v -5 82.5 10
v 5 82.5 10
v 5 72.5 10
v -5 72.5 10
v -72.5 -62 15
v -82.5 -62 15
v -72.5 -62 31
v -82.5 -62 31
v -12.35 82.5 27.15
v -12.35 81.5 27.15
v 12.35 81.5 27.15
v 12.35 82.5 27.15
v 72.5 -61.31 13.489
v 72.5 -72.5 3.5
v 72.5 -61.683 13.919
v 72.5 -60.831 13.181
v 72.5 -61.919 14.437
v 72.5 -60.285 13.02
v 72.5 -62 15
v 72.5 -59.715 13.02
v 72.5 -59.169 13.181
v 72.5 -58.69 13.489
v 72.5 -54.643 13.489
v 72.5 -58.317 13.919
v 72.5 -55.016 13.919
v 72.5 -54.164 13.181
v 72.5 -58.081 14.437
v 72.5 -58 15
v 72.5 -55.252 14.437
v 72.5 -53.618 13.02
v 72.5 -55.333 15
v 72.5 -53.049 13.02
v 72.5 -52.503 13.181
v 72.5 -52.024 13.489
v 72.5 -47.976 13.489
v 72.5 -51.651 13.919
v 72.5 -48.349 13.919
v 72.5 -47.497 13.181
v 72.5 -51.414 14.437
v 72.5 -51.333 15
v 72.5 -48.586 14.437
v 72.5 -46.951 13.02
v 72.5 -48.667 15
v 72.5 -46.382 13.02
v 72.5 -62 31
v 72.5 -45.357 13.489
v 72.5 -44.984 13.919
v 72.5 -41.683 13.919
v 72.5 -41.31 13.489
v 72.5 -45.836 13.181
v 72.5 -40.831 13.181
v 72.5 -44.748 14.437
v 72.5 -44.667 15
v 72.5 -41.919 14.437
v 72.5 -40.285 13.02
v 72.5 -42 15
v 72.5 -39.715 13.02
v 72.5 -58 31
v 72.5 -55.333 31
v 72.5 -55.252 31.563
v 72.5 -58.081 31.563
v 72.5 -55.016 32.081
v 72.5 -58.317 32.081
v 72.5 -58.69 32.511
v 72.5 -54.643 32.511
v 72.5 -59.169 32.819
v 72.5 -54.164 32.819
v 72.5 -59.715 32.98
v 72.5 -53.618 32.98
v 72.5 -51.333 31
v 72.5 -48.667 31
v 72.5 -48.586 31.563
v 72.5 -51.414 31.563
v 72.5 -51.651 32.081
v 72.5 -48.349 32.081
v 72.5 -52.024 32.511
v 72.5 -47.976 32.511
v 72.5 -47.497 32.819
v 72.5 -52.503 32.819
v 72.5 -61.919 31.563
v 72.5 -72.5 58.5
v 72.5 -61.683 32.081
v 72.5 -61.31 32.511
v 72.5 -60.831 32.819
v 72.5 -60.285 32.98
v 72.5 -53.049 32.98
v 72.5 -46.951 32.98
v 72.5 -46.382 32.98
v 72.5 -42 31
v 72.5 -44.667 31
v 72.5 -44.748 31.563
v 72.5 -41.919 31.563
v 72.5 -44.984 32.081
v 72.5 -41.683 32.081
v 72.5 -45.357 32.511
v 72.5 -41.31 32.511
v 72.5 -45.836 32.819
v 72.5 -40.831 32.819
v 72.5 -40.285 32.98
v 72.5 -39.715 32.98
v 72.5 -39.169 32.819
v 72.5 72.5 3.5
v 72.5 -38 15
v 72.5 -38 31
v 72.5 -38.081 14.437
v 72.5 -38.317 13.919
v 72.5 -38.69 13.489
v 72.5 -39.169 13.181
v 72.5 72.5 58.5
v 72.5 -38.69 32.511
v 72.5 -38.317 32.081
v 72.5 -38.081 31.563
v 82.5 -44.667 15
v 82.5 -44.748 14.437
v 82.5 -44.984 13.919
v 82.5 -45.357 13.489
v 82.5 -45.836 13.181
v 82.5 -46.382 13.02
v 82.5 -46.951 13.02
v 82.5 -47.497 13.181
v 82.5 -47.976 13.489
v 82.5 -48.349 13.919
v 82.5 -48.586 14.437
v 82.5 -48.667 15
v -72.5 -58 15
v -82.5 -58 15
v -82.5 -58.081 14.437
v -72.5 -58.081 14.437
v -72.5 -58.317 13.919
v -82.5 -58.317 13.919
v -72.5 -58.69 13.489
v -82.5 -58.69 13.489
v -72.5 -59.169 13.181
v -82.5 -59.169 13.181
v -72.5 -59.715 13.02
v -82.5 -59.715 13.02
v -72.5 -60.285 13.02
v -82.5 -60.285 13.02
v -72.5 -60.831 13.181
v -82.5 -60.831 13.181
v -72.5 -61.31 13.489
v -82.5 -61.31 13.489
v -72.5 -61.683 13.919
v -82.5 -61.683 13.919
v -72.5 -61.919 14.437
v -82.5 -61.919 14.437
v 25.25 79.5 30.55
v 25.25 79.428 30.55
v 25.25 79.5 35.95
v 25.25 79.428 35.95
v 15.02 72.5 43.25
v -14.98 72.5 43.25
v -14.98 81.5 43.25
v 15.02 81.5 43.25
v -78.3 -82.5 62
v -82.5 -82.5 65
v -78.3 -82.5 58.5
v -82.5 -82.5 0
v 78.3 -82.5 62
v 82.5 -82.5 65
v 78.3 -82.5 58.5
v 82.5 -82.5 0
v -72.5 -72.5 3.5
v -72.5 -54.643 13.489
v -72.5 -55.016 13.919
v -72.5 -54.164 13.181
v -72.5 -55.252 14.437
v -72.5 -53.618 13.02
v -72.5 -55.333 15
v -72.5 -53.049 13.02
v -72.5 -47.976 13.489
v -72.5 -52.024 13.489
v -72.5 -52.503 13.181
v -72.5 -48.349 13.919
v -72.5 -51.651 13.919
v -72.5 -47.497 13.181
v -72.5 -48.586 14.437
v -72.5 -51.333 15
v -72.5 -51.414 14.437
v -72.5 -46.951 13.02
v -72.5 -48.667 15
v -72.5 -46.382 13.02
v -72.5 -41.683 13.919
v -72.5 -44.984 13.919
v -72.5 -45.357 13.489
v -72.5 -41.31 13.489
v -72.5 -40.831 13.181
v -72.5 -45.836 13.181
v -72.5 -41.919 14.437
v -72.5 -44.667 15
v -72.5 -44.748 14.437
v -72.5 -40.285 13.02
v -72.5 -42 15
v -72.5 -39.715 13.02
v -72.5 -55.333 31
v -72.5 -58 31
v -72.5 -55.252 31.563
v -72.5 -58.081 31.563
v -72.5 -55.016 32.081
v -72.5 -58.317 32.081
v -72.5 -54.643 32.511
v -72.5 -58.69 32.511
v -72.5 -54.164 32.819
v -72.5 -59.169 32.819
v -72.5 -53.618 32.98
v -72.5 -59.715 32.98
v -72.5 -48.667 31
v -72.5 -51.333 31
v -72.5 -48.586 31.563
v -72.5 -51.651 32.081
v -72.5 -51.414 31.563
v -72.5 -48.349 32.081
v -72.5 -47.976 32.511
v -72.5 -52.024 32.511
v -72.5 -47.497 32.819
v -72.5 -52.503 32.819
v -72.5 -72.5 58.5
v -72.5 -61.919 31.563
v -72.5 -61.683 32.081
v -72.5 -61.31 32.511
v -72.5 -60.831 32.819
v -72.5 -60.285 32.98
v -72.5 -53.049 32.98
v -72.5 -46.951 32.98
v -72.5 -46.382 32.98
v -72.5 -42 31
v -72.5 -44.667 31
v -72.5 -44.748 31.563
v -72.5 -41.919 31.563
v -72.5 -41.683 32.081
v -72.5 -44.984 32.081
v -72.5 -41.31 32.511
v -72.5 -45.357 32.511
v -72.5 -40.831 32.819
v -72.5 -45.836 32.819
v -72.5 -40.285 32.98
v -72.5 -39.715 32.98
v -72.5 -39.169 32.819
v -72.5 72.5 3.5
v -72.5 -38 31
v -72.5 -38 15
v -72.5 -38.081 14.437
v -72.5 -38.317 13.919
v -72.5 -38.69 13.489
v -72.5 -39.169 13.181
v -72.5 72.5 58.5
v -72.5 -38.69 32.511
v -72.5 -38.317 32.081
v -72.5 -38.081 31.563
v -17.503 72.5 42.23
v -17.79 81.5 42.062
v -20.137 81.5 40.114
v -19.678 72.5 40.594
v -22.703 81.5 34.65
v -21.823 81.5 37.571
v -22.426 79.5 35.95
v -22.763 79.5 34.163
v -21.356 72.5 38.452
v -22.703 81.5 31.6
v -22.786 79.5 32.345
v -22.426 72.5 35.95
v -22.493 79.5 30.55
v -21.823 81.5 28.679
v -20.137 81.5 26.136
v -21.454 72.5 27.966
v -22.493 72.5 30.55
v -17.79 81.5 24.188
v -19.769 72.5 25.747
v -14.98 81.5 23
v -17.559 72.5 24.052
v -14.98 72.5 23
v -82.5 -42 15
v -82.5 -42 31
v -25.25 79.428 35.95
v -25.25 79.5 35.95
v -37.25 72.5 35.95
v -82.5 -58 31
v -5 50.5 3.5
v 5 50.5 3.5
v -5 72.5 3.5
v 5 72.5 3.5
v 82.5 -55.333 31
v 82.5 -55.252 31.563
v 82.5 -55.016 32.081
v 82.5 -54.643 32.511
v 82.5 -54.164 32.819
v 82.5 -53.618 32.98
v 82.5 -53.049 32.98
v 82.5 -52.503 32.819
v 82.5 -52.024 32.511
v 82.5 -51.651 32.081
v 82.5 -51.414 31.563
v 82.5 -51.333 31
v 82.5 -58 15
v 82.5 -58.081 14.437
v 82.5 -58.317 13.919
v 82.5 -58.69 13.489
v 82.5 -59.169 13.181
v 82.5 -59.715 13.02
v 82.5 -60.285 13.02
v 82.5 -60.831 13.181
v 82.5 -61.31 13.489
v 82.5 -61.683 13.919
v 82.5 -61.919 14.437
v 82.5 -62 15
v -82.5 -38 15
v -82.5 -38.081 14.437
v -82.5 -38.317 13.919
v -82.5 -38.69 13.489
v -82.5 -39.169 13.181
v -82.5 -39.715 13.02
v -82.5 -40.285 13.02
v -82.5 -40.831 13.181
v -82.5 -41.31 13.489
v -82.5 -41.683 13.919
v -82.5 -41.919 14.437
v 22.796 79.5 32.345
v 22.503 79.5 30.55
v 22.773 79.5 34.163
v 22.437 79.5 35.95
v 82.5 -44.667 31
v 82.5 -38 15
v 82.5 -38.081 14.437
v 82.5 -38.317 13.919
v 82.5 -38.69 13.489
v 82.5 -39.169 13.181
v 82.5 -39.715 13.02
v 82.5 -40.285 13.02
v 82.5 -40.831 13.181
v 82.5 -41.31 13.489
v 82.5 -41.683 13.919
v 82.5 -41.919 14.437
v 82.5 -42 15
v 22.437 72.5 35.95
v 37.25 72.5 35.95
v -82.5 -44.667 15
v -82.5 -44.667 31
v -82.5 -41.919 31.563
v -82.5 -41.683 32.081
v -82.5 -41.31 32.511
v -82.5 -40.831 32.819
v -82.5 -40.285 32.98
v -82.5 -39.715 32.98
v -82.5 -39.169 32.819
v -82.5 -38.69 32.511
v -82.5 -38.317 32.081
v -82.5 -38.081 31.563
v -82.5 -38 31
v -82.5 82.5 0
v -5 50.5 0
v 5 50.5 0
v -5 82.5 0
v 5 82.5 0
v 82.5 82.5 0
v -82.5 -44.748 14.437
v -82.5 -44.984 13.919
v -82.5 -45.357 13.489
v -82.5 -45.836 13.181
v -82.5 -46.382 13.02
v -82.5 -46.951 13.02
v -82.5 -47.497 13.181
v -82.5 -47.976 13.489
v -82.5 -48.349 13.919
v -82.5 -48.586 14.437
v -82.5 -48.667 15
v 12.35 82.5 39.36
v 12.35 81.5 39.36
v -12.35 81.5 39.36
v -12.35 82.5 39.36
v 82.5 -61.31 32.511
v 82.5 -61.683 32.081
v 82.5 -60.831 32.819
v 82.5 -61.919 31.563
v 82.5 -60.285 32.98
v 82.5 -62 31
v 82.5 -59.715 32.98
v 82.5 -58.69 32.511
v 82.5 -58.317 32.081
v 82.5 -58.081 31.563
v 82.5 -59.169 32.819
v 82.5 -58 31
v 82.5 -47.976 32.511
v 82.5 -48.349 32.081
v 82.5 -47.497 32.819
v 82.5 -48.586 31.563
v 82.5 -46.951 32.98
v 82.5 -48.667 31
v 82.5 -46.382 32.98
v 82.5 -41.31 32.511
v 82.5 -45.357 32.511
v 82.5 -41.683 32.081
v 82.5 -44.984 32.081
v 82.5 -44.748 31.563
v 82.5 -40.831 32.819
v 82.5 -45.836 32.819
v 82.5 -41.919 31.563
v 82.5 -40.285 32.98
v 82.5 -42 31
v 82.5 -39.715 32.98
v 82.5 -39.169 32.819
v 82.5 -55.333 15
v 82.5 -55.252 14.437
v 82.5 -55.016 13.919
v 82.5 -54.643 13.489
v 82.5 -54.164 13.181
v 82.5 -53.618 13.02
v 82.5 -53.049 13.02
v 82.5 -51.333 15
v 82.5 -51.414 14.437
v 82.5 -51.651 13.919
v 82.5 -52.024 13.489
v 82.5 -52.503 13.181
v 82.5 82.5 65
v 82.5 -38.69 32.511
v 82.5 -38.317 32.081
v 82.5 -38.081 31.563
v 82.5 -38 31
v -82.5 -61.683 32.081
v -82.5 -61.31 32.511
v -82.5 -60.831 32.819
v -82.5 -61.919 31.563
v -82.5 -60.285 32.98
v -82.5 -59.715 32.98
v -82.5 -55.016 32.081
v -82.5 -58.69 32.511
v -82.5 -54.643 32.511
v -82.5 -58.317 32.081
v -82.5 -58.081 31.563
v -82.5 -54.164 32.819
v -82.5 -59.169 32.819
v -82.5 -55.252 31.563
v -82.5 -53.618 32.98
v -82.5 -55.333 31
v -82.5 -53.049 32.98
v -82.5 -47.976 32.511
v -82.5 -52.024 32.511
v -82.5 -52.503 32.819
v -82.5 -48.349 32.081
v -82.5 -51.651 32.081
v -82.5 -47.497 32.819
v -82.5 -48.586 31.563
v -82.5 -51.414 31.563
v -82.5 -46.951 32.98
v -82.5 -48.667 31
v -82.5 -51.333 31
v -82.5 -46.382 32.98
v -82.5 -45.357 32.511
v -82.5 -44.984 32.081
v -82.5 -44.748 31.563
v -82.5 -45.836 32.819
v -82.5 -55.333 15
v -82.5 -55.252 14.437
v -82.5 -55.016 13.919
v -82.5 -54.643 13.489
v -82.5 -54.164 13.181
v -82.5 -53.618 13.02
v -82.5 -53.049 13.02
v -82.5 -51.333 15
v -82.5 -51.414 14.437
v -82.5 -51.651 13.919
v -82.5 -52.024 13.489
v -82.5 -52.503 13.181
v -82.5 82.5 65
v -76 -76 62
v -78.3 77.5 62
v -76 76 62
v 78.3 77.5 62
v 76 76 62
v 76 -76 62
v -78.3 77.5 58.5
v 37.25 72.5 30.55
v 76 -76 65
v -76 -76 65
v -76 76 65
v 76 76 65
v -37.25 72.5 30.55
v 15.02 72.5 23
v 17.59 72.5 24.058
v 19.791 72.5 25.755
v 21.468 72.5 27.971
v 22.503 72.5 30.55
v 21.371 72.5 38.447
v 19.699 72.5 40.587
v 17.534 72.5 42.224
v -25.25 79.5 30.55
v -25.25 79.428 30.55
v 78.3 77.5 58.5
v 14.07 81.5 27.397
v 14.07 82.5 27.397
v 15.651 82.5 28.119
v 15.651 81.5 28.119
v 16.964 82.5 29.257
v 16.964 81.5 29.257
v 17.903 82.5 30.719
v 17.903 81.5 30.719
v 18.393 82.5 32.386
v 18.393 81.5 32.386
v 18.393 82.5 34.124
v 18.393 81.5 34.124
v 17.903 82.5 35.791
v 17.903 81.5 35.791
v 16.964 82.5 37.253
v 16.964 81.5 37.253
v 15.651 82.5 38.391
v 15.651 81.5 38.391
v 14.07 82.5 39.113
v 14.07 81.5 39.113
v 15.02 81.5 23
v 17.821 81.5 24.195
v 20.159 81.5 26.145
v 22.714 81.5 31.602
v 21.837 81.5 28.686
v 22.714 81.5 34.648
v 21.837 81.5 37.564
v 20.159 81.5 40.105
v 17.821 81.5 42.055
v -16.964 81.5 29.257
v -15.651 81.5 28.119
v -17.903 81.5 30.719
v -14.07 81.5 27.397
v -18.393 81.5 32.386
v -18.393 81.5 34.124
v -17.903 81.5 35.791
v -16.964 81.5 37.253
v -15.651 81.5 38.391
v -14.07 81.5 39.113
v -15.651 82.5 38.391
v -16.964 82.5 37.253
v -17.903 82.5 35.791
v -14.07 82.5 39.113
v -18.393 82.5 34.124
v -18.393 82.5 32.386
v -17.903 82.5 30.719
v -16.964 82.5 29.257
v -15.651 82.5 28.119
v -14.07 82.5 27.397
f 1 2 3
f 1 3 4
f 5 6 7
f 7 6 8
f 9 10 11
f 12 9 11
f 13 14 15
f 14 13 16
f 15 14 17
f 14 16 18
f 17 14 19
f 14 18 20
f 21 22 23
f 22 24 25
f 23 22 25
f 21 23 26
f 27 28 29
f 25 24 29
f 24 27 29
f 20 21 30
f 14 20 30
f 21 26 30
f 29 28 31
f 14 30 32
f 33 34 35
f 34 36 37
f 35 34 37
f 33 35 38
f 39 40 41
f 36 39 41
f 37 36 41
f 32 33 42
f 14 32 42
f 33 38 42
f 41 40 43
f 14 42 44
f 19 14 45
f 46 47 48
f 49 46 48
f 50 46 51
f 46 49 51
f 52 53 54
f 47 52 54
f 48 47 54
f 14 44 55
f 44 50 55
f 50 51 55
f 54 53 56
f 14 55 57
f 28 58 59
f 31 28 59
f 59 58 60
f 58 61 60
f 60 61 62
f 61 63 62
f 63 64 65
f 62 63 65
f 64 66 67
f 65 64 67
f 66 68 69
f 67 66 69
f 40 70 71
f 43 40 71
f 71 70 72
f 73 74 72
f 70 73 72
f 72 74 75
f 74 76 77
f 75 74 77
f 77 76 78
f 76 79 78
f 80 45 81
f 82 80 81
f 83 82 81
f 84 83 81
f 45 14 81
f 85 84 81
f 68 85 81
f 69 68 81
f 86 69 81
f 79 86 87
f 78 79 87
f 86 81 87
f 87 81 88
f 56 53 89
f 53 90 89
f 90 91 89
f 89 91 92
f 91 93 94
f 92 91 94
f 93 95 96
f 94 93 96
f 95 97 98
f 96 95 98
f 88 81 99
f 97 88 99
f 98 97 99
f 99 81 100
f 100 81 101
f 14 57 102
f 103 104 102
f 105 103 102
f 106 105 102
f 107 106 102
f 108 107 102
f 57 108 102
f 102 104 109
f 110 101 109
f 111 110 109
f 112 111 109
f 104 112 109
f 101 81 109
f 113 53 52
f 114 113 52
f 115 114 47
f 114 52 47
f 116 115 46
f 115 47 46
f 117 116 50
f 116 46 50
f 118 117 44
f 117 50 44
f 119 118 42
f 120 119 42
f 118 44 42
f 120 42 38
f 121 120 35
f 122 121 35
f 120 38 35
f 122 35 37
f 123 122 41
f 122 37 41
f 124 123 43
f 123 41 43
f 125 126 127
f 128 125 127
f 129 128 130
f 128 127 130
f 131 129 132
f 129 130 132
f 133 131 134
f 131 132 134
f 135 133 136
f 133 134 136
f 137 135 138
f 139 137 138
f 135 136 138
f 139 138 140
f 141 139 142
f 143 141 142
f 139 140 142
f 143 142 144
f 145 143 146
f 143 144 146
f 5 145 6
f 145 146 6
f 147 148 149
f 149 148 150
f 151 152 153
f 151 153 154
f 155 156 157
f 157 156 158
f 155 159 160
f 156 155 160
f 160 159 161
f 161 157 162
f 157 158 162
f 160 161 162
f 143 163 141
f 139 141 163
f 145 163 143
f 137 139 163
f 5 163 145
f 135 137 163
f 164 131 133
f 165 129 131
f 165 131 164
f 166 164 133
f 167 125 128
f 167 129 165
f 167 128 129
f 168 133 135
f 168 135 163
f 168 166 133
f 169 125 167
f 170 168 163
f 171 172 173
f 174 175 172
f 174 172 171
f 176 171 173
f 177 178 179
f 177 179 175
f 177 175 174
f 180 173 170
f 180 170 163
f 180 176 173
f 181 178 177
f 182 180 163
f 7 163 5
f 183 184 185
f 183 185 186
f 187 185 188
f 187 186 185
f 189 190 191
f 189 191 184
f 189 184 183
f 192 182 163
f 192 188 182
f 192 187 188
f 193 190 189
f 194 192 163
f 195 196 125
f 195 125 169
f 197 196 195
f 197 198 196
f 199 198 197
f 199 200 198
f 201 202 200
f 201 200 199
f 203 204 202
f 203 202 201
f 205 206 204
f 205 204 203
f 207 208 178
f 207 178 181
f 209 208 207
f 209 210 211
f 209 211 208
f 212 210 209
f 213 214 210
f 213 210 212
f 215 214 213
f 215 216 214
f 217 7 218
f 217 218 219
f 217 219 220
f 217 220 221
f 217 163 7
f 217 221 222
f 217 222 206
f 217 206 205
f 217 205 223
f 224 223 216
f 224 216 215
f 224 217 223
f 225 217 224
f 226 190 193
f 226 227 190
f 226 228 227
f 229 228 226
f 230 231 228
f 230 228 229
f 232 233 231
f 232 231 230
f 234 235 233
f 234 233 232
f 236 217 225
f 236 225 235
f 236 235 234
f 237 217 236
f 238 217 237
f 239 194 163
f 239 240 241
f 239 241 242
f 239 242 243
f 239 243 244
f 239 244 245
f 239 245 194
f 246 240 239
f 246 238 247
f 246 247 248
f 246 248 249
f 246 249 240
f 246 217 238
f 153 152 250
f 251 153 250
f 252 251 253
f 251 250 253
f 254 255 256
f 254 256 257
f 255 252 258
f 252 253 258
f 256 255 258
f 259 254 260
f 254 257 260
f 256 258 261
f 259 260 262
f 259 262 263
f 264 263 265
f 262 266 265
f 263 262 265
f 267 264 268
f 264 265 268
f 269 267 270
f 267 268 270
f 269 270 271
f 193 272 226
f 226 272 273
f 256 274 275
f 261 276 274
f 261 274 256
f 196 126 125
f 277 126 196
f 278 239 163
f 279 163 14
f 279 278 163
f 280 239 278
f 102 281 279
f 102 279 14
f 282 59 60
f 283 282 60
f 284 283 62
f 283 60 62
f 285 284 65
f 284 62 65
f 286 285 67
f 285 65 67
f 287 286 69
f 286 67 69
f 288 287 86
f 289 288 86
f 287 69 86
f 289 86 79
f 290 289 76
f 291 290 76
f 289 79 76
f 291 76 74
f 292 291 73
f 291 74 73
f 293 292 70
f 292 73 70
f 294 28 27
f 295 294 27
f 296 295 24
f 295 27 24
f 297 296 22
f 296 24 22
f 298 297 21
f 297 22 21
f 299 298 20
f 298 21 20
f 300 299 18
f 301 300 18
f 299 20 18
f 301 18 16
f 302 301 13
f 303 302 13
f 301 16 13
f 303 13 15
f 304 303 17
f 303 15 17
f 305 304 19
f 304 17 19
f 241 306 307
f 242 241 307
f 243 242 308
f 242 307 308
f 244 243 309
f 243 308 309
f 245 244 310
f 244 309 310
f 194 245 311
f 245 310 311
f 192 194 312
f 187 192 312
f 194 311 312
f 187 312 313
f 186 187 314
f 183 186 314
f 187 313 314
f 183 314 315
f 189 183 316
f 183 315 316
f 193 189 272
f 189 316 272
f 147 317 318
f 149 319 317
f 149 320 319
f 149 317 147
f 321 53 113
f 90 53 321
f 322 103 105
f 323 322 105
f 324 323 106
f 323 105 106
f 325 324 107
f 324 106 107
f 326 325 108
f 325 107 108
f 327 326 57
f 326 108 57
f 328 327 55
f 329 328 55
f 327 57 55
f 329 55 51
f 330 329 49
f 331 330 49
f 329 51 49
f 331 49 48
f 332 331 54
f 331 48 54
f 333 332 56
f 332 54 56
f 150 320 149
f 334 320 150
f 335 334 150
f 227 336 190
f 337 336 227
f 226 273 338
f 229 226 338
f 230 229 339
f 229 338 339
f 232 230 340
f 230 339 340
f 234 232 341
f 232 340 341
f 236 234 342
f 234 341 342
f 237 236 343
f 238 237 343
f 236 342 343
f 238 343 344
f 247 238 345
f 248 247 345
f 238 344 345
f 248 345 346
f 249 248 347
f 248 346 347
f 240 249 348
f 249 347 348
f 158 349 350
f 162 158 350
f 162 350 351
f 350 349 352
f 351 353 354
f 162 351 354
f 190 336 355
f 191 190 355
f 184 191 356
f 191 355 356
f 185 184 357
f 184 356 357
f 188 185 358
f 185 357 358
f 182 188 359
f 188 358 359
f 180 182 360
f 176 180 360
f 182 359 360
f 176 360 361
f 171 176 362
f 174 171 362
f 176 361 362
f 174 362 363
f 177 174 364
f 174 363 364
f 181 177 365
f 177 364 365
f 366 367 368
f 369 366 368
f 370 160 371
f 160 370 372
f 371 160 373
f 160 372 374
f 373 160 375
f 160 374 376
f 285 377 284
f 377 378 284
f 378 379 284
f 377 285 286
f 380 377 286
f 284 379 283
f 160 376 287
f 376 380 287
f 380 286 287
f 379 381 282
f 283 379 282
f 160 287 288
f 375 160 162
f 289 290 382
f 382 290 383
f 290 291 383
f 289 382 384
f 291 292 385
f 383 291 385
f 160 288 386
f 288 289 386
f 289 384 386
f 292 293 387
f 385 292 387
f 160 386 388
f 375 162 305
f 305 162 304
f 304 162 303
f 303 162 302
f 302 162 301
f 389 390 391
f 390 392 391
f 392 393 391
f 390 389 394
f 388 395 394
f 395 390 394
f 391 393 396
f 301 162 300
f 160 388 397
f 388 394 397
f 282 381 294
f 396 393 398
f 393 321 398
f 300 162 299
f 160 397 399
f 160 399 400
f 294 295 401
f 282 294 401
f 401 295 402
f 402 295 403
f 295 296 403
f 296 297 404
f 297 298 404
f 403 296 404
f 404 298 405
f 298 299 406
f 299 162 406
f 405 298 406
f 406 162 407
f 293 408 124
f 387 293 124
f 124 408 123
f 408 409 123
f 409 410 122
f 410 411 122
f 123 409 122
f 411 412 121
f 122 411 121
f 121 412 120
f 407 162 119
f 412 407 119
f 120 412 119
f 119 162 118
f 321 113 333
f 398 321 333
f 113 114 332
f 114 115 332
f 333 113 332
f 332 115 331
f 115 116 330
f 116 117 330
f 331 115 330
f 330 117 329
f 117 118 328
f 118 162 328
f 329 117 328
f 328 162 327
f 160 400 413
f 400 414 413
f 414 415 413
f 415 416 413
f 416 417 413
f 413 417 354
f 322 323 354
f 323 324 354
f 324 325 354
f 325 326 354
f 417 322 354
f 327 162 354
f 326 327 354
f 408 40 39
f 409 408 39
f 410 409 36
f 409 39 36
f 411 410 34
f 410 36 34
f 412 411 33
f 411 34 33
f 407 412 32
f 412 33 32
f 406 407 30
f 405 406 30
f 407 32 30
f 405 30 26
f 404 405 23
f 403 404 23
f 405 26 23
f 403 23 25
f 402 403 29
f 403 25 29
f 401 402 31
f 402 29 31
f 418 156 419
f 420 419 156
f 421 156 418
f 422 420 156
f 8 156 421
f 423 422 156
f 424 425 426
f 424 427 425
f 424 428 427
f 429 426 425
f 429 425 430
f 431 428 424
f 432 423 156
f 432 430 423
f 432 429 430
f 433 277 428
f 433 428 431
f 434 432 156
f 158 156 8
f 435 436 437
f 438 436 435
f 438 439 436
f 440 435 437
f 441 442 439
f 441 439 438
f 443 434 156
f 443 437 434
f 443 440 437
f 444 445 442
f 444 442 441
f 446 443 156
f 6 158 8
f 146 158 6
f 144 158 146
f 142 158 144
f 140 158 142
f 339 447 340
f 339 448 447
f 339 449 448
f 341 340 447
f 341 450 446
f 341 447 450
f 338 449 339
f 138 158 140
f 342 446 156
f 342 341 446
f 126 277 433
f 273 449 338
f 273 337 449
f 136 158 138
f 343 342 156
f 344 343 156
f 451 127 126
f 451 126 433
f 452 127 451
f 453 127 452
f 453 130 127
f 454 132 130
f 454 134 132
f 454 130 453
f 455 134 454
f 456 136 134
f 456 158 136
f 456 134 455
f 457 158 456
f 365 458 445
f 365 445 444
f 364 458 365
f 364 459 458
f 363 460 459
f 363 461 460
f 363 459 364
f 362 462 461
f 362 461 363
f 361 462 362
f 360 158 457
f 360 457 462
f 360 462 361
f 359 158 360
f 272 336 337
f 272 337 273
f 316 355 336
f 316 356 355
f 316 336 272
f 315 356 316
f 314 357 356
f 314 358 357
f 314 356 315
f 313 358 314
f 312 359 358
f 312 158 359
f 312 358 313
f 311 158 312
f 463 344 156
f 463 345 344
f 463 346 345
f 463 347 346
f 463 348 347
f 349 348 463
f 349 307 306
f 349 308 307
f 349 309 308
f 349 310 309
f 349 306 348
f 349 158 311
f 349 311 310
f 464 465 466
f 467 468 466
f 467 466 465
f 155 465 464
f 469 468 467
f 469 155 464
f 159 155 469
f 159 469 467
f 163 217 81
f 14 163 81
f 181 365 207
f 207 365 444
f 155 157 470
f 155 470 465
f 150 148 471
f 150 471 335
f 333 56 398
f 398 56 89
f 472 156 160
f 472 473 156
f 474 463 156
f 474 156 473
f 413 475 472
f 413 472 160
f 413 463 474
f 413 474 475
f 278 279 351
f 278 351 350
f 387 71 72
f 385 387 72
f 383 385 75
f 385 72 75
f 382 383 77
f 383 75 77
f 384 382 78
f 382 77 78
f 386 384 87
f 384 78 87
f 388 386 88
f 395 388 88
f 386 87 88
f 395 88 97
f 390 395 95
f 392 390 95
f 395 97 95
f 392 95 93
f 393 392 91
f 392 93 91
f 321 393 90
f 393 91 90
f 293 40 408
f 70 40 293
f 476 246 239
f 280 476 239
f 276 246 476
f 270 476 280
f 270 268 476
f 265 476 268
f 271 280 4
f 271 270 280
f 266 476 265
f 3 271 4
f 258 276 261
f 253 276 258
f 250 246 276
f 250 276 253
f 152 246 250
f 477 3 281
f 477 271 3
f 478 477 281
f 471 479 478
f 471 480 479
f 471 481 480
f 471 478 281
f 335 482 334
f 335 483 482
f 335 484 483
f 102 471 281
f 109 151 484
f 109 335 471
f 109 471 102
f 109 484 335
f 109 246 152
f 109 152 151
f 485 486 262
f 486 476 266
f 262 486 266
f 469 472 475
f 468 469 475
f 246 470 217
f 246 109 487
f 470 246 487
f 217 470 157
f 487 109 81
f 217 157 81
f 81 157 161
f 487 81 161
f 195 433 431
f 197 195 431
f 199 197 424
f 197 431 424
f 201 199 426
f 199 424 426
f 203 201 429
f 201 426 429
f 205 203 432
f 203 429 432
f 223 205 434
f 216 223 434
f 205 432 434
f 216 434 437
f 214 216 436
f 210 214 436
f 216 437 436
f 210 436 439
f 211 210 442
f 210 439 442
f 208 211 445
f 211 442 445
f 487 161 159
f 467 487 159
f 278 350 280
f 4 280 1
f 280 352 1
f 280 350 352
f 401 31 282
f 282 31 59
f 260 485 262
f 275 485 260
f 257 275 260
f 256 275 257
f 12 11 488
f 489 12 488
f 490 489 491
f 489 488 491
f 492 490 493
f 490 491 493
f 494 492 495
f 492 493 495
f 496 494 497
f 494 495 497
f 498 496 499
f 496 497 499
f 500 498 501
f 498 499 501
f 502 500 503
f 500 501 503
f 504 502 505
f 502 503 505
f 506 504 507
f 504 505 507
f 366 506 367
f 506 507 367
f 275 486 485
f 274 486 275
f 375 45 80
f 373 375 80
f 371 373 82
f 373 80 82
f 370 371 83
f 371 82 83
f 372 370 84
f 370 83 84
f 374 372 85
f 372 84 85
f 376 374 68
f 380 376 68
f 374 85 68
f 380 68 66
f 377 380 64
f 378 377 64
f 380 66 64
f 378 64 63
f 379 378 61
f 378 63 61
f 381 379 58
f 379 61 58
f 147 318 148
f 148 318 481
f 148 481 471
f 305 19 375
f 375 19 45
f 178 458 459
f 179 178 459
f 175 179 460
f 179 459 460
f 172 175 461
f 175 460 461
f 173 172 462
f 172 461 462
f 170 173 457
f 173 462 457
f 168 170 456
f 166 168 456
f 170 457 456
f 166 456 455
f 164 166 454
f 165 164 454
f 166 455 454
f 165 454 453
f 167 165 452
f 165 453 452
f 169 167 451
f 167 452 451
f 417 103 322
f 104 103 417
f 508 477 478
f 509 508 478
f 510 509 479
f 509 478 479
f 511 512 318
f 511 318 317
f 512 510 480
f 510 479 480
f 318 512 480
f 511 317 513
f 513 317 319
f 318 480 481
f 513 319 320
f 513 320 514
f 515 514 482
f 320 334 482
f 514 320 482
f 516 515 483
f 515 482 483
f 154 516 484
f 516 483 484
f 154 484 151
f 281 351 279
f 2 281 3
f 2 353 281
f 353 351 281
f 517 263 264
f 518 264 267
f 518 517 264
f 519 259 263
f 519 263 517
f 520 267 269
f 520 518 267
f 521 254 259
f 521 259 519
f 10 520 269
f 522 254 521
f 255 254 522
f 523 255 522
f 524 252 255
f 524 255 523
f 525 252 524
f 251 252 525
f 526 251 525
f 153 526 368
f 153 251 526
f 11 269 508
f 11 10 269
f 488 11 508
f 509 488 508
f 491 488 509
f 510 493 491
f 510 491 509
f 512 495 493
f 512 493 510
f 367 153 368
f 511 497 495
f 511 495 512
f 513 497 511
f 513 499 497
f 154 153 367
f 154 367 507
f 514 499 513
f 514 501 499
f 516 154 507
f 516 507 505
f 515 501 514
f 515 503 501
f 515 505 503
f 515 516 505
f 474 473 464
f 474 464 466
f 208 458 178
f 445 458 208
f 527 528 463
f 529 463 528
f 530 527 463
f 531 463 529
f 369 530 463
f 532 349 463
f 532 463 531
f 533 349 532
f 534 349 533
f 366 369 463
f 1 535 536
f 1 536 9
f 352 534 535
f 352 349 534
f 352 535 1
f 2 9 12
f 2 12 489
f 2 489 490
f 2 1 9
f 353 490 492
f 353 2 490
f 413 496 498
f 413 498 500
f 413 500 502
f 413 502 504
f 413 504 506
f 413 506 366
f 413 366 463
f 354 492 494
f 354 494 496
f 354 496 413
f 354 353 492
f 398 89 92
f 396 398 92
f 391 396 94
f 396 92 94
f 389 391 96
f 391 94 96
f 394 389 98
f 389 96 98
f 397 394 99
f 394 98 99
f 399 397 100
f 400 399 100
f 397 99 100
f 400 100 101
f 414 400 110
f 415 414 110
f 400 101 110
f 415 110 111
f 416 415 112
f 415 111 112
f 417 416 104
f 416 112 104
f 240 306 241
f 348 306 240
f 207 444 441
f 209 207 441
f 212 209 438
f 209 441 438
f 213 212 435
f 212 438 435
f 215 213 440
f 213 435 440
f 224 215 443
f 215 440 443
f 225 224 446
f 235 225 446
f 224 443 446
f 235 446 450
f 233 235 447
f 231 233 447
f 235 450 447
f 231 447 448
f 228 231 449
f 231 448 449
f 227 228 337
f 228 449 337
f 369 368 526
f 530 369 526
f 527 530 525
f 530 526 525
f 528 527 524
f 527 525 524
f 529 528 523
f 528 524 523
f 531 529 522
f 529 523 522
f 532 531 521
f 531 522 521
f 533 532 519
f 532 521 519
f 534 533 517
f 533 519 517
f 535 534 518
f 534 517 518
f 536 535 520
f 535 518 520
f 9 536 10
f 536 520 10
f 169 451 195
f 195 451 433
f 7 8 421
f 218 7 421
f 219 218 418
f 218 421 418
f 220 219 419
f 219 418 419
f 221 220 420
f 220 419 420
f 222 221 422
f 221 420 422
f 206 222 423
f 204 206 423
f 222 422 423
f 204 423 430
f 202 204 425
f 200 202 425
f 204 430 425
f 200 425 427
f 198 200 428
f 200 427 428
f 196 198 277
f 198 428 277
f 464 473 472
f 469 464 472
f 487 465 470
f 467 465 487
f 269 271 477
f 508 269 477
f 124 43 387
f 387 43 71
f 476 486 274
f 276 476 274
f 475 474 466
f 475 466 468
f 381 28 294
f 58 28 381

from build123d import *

# Parameters (mm, degrees)
SKETCH_W            = 165
SKETCH_H            = 165
PAD_DEPTH           = 65
SKETCH002_W         = 152
SKETCH002_H         = 152
POCKET_DEPTH        = 6.5
SKETCH003_W         = 145
SKETCH003_H         = 145
POCKET001_DEPTH     = 55
SKETCH005_W         = 156.6
SKETCH005_H         = 3.5
POCKET003_DEPTH     = 160
POCKET004_DEPTH     = 165.001
LINEARPATTERN_COUNT = 4
LINEARPATTERN_PITCH = 6.666667
SKETCH008_W         = 10
SKETCH008_H         = 10
POCKET005_DEPTH     = 32
POCKET006_DEPTH     = 9
SKETCH013_W         = 50.5
SKETCH013_H         = 5.4
POCKET007_DEPTH     = 7
CHAMFER_ANGLE       = 30
CHAMFER_SIZE        = 12
CHAMFER001_ANGLE    = 30
CHAMFER001_SIZE     = 12
POCKET008_DEPTH     = 1.001


with BuildPart() as part:
    # Sketch → Pad (new body)
    with BuildSketch(Plane.XY):
        Rectangle(SKETCH_W, SKETCH_H)
    extrude(amount=PAD_DEPTH)

    # Sketch002 (on Face6 of Pad) → Pocket (cut)
    with BuildSketch(Plane.XY.offset(65)):
        Rectangle(SKETCH002_W, SKETCH002_H)
    extrude(amount=-POCKET_DEPTH, mode=Mode.SUBTRACT)

    # Sketch003 (on Face11 of Pocket) → Pocket001 (cut)
    with BuildSketch(Plane.XY.offset(58.5)):
        Rectangle(SKETCH003_W, SKETCH003_H)
    extrude(amount=-POCKET001_DEPTH, mode=Mode.SUBTRACT)

    # Sketch005 → Pocket003 (cut)
    with BuildSketch(Plane.XZ.offset(82.5)):
        with Locations((0, 60.25)):
            Rectangle(SKETCH005_W, SKETCH005_H)
    extrude(amount=-POCKET003_DEPTH, mode=Mode.SUBTRACT)

    # Sketch007 (on Face2 of Pocket003) → Pocket004 (cut, through all)
    with BuildSketch(Plane(origin=(-82.5, 0, 0), x_dir=(0, -1, 0), z_dir=(-1, 0, 0))):
        with BuildLine():
            ThreePointArc((58, 15), (60, 13), (62, 15))
            Line((62, 15), (62, 31))
            ThreePointArc((62, 31), (60, 33), (58, 31))
            Line((58, 15), (58, 31))
        make_face()
    pocket004 = extrude(amount=-POCKET004_DEPTH, mode=Mode.SUBTRACT)

    # LinearPattern: Pocket004 ×4
    with Locations(*[(0, i * LINEARPATTERN_PITCH, 0) for i in range(1, LINEARPATTERN_COUNT)]):
        add(pocket004, mode=Mode.SUBTRACT)

    # Sketch008 (on Face10 of LinearPattern) → Pocket005 (cut)
    with BuildSketch(Plane(origin=(0, 82.5, 0), x_dir=(-1, 0, 0), z_dir=(0, 1, 0))):
        with Locations((0, 5)):
            Rectangle(SKETCH008_W, SKETCH008_H)
    extrude(amount=-POCKET005_DEPTH, mode=Mode.SUBTRACT)

    # Sketch012 (on Face53 of Pocket005) → Pocket006 (cut)
    with BuildSketch(Plane.XZ.offset(-72.5)):
        with BuildLine():
            ThreePointArc((-14.98, 43.25), (-22.814744, 33.125), (-14.98, 23))
            Line((-14.98, 23), (15.02, 23))
            ThreePointArc((15.02, 23), (22.824854, 33.125), (15.02, 43.25))
            Line((-14.98, 43.25), (15.02, 43.25))
        make_face()
    extrude(amount=-POCKET006_DEPTH, mode=Mode.SUBTRACT)

    # Sketch013 (on Face53 of Pocket006) → Pocket007 (cut)
    with BuildSketch(Plane.XZ.offset(-72.5)):
        with Locations((0, 33.25)):
            Rectangle(SKETCH013_W, SKETCH013_H)
    extrude(amount=-POCKET007_DEPTH, mode=Mode.SUBTRACT)

    # Chamfer
    chamfer_edges = [part.edges().sort_by_distance(p)[0] for p in [
        (-25.25, 72.5, 33.25),
    ]]
    chamfer_side = part.faces().sort_by_distance((0, 72.5, 56.949194))[0]
    chamfer(chamfer_edges, length=CHAMFER_SIZE, angle=CHAMFER_ANGLE, reference=chamfer_side)

    # Chamfer001
    chamfer001_edges = [part.edges().sort_by_distance(p)[0] for p in [
        (25.25, 72.5, 33.25),
    ]]
    chamfer001_side = part.faces().sort_by_distance((-31.25, 72.5, 37.500806))[0]
    chamfer(chamfer001_edges, length=CHAMFER001_SIZE, angle=CHAMFER001_ANGLE, reference=chamfer001_side)

    # Sketch014 (on Face21 of Chamfer001) → Pocket008 (cut, through all)
    with BuildSketch(Plane.XZ.offset(-81.5)):
        with BuildLine():
            Line((12.35, 39.36), (-12.35, 39.36))
            ThreePointArc((-12.35, 39.36), (-18.455, 33.255), (-12.35, 27.15))
            Line((-12.35, 27.15), (12.35, 27.15))
            ThreePointArc((12.35, 27.15), (18.455, 33.255), (12.35, 39.36))
        make_face()
    extrude(amount=-POCKET008_DEPTH, mode=Mode.SUBTRACT)


solid = part.part
